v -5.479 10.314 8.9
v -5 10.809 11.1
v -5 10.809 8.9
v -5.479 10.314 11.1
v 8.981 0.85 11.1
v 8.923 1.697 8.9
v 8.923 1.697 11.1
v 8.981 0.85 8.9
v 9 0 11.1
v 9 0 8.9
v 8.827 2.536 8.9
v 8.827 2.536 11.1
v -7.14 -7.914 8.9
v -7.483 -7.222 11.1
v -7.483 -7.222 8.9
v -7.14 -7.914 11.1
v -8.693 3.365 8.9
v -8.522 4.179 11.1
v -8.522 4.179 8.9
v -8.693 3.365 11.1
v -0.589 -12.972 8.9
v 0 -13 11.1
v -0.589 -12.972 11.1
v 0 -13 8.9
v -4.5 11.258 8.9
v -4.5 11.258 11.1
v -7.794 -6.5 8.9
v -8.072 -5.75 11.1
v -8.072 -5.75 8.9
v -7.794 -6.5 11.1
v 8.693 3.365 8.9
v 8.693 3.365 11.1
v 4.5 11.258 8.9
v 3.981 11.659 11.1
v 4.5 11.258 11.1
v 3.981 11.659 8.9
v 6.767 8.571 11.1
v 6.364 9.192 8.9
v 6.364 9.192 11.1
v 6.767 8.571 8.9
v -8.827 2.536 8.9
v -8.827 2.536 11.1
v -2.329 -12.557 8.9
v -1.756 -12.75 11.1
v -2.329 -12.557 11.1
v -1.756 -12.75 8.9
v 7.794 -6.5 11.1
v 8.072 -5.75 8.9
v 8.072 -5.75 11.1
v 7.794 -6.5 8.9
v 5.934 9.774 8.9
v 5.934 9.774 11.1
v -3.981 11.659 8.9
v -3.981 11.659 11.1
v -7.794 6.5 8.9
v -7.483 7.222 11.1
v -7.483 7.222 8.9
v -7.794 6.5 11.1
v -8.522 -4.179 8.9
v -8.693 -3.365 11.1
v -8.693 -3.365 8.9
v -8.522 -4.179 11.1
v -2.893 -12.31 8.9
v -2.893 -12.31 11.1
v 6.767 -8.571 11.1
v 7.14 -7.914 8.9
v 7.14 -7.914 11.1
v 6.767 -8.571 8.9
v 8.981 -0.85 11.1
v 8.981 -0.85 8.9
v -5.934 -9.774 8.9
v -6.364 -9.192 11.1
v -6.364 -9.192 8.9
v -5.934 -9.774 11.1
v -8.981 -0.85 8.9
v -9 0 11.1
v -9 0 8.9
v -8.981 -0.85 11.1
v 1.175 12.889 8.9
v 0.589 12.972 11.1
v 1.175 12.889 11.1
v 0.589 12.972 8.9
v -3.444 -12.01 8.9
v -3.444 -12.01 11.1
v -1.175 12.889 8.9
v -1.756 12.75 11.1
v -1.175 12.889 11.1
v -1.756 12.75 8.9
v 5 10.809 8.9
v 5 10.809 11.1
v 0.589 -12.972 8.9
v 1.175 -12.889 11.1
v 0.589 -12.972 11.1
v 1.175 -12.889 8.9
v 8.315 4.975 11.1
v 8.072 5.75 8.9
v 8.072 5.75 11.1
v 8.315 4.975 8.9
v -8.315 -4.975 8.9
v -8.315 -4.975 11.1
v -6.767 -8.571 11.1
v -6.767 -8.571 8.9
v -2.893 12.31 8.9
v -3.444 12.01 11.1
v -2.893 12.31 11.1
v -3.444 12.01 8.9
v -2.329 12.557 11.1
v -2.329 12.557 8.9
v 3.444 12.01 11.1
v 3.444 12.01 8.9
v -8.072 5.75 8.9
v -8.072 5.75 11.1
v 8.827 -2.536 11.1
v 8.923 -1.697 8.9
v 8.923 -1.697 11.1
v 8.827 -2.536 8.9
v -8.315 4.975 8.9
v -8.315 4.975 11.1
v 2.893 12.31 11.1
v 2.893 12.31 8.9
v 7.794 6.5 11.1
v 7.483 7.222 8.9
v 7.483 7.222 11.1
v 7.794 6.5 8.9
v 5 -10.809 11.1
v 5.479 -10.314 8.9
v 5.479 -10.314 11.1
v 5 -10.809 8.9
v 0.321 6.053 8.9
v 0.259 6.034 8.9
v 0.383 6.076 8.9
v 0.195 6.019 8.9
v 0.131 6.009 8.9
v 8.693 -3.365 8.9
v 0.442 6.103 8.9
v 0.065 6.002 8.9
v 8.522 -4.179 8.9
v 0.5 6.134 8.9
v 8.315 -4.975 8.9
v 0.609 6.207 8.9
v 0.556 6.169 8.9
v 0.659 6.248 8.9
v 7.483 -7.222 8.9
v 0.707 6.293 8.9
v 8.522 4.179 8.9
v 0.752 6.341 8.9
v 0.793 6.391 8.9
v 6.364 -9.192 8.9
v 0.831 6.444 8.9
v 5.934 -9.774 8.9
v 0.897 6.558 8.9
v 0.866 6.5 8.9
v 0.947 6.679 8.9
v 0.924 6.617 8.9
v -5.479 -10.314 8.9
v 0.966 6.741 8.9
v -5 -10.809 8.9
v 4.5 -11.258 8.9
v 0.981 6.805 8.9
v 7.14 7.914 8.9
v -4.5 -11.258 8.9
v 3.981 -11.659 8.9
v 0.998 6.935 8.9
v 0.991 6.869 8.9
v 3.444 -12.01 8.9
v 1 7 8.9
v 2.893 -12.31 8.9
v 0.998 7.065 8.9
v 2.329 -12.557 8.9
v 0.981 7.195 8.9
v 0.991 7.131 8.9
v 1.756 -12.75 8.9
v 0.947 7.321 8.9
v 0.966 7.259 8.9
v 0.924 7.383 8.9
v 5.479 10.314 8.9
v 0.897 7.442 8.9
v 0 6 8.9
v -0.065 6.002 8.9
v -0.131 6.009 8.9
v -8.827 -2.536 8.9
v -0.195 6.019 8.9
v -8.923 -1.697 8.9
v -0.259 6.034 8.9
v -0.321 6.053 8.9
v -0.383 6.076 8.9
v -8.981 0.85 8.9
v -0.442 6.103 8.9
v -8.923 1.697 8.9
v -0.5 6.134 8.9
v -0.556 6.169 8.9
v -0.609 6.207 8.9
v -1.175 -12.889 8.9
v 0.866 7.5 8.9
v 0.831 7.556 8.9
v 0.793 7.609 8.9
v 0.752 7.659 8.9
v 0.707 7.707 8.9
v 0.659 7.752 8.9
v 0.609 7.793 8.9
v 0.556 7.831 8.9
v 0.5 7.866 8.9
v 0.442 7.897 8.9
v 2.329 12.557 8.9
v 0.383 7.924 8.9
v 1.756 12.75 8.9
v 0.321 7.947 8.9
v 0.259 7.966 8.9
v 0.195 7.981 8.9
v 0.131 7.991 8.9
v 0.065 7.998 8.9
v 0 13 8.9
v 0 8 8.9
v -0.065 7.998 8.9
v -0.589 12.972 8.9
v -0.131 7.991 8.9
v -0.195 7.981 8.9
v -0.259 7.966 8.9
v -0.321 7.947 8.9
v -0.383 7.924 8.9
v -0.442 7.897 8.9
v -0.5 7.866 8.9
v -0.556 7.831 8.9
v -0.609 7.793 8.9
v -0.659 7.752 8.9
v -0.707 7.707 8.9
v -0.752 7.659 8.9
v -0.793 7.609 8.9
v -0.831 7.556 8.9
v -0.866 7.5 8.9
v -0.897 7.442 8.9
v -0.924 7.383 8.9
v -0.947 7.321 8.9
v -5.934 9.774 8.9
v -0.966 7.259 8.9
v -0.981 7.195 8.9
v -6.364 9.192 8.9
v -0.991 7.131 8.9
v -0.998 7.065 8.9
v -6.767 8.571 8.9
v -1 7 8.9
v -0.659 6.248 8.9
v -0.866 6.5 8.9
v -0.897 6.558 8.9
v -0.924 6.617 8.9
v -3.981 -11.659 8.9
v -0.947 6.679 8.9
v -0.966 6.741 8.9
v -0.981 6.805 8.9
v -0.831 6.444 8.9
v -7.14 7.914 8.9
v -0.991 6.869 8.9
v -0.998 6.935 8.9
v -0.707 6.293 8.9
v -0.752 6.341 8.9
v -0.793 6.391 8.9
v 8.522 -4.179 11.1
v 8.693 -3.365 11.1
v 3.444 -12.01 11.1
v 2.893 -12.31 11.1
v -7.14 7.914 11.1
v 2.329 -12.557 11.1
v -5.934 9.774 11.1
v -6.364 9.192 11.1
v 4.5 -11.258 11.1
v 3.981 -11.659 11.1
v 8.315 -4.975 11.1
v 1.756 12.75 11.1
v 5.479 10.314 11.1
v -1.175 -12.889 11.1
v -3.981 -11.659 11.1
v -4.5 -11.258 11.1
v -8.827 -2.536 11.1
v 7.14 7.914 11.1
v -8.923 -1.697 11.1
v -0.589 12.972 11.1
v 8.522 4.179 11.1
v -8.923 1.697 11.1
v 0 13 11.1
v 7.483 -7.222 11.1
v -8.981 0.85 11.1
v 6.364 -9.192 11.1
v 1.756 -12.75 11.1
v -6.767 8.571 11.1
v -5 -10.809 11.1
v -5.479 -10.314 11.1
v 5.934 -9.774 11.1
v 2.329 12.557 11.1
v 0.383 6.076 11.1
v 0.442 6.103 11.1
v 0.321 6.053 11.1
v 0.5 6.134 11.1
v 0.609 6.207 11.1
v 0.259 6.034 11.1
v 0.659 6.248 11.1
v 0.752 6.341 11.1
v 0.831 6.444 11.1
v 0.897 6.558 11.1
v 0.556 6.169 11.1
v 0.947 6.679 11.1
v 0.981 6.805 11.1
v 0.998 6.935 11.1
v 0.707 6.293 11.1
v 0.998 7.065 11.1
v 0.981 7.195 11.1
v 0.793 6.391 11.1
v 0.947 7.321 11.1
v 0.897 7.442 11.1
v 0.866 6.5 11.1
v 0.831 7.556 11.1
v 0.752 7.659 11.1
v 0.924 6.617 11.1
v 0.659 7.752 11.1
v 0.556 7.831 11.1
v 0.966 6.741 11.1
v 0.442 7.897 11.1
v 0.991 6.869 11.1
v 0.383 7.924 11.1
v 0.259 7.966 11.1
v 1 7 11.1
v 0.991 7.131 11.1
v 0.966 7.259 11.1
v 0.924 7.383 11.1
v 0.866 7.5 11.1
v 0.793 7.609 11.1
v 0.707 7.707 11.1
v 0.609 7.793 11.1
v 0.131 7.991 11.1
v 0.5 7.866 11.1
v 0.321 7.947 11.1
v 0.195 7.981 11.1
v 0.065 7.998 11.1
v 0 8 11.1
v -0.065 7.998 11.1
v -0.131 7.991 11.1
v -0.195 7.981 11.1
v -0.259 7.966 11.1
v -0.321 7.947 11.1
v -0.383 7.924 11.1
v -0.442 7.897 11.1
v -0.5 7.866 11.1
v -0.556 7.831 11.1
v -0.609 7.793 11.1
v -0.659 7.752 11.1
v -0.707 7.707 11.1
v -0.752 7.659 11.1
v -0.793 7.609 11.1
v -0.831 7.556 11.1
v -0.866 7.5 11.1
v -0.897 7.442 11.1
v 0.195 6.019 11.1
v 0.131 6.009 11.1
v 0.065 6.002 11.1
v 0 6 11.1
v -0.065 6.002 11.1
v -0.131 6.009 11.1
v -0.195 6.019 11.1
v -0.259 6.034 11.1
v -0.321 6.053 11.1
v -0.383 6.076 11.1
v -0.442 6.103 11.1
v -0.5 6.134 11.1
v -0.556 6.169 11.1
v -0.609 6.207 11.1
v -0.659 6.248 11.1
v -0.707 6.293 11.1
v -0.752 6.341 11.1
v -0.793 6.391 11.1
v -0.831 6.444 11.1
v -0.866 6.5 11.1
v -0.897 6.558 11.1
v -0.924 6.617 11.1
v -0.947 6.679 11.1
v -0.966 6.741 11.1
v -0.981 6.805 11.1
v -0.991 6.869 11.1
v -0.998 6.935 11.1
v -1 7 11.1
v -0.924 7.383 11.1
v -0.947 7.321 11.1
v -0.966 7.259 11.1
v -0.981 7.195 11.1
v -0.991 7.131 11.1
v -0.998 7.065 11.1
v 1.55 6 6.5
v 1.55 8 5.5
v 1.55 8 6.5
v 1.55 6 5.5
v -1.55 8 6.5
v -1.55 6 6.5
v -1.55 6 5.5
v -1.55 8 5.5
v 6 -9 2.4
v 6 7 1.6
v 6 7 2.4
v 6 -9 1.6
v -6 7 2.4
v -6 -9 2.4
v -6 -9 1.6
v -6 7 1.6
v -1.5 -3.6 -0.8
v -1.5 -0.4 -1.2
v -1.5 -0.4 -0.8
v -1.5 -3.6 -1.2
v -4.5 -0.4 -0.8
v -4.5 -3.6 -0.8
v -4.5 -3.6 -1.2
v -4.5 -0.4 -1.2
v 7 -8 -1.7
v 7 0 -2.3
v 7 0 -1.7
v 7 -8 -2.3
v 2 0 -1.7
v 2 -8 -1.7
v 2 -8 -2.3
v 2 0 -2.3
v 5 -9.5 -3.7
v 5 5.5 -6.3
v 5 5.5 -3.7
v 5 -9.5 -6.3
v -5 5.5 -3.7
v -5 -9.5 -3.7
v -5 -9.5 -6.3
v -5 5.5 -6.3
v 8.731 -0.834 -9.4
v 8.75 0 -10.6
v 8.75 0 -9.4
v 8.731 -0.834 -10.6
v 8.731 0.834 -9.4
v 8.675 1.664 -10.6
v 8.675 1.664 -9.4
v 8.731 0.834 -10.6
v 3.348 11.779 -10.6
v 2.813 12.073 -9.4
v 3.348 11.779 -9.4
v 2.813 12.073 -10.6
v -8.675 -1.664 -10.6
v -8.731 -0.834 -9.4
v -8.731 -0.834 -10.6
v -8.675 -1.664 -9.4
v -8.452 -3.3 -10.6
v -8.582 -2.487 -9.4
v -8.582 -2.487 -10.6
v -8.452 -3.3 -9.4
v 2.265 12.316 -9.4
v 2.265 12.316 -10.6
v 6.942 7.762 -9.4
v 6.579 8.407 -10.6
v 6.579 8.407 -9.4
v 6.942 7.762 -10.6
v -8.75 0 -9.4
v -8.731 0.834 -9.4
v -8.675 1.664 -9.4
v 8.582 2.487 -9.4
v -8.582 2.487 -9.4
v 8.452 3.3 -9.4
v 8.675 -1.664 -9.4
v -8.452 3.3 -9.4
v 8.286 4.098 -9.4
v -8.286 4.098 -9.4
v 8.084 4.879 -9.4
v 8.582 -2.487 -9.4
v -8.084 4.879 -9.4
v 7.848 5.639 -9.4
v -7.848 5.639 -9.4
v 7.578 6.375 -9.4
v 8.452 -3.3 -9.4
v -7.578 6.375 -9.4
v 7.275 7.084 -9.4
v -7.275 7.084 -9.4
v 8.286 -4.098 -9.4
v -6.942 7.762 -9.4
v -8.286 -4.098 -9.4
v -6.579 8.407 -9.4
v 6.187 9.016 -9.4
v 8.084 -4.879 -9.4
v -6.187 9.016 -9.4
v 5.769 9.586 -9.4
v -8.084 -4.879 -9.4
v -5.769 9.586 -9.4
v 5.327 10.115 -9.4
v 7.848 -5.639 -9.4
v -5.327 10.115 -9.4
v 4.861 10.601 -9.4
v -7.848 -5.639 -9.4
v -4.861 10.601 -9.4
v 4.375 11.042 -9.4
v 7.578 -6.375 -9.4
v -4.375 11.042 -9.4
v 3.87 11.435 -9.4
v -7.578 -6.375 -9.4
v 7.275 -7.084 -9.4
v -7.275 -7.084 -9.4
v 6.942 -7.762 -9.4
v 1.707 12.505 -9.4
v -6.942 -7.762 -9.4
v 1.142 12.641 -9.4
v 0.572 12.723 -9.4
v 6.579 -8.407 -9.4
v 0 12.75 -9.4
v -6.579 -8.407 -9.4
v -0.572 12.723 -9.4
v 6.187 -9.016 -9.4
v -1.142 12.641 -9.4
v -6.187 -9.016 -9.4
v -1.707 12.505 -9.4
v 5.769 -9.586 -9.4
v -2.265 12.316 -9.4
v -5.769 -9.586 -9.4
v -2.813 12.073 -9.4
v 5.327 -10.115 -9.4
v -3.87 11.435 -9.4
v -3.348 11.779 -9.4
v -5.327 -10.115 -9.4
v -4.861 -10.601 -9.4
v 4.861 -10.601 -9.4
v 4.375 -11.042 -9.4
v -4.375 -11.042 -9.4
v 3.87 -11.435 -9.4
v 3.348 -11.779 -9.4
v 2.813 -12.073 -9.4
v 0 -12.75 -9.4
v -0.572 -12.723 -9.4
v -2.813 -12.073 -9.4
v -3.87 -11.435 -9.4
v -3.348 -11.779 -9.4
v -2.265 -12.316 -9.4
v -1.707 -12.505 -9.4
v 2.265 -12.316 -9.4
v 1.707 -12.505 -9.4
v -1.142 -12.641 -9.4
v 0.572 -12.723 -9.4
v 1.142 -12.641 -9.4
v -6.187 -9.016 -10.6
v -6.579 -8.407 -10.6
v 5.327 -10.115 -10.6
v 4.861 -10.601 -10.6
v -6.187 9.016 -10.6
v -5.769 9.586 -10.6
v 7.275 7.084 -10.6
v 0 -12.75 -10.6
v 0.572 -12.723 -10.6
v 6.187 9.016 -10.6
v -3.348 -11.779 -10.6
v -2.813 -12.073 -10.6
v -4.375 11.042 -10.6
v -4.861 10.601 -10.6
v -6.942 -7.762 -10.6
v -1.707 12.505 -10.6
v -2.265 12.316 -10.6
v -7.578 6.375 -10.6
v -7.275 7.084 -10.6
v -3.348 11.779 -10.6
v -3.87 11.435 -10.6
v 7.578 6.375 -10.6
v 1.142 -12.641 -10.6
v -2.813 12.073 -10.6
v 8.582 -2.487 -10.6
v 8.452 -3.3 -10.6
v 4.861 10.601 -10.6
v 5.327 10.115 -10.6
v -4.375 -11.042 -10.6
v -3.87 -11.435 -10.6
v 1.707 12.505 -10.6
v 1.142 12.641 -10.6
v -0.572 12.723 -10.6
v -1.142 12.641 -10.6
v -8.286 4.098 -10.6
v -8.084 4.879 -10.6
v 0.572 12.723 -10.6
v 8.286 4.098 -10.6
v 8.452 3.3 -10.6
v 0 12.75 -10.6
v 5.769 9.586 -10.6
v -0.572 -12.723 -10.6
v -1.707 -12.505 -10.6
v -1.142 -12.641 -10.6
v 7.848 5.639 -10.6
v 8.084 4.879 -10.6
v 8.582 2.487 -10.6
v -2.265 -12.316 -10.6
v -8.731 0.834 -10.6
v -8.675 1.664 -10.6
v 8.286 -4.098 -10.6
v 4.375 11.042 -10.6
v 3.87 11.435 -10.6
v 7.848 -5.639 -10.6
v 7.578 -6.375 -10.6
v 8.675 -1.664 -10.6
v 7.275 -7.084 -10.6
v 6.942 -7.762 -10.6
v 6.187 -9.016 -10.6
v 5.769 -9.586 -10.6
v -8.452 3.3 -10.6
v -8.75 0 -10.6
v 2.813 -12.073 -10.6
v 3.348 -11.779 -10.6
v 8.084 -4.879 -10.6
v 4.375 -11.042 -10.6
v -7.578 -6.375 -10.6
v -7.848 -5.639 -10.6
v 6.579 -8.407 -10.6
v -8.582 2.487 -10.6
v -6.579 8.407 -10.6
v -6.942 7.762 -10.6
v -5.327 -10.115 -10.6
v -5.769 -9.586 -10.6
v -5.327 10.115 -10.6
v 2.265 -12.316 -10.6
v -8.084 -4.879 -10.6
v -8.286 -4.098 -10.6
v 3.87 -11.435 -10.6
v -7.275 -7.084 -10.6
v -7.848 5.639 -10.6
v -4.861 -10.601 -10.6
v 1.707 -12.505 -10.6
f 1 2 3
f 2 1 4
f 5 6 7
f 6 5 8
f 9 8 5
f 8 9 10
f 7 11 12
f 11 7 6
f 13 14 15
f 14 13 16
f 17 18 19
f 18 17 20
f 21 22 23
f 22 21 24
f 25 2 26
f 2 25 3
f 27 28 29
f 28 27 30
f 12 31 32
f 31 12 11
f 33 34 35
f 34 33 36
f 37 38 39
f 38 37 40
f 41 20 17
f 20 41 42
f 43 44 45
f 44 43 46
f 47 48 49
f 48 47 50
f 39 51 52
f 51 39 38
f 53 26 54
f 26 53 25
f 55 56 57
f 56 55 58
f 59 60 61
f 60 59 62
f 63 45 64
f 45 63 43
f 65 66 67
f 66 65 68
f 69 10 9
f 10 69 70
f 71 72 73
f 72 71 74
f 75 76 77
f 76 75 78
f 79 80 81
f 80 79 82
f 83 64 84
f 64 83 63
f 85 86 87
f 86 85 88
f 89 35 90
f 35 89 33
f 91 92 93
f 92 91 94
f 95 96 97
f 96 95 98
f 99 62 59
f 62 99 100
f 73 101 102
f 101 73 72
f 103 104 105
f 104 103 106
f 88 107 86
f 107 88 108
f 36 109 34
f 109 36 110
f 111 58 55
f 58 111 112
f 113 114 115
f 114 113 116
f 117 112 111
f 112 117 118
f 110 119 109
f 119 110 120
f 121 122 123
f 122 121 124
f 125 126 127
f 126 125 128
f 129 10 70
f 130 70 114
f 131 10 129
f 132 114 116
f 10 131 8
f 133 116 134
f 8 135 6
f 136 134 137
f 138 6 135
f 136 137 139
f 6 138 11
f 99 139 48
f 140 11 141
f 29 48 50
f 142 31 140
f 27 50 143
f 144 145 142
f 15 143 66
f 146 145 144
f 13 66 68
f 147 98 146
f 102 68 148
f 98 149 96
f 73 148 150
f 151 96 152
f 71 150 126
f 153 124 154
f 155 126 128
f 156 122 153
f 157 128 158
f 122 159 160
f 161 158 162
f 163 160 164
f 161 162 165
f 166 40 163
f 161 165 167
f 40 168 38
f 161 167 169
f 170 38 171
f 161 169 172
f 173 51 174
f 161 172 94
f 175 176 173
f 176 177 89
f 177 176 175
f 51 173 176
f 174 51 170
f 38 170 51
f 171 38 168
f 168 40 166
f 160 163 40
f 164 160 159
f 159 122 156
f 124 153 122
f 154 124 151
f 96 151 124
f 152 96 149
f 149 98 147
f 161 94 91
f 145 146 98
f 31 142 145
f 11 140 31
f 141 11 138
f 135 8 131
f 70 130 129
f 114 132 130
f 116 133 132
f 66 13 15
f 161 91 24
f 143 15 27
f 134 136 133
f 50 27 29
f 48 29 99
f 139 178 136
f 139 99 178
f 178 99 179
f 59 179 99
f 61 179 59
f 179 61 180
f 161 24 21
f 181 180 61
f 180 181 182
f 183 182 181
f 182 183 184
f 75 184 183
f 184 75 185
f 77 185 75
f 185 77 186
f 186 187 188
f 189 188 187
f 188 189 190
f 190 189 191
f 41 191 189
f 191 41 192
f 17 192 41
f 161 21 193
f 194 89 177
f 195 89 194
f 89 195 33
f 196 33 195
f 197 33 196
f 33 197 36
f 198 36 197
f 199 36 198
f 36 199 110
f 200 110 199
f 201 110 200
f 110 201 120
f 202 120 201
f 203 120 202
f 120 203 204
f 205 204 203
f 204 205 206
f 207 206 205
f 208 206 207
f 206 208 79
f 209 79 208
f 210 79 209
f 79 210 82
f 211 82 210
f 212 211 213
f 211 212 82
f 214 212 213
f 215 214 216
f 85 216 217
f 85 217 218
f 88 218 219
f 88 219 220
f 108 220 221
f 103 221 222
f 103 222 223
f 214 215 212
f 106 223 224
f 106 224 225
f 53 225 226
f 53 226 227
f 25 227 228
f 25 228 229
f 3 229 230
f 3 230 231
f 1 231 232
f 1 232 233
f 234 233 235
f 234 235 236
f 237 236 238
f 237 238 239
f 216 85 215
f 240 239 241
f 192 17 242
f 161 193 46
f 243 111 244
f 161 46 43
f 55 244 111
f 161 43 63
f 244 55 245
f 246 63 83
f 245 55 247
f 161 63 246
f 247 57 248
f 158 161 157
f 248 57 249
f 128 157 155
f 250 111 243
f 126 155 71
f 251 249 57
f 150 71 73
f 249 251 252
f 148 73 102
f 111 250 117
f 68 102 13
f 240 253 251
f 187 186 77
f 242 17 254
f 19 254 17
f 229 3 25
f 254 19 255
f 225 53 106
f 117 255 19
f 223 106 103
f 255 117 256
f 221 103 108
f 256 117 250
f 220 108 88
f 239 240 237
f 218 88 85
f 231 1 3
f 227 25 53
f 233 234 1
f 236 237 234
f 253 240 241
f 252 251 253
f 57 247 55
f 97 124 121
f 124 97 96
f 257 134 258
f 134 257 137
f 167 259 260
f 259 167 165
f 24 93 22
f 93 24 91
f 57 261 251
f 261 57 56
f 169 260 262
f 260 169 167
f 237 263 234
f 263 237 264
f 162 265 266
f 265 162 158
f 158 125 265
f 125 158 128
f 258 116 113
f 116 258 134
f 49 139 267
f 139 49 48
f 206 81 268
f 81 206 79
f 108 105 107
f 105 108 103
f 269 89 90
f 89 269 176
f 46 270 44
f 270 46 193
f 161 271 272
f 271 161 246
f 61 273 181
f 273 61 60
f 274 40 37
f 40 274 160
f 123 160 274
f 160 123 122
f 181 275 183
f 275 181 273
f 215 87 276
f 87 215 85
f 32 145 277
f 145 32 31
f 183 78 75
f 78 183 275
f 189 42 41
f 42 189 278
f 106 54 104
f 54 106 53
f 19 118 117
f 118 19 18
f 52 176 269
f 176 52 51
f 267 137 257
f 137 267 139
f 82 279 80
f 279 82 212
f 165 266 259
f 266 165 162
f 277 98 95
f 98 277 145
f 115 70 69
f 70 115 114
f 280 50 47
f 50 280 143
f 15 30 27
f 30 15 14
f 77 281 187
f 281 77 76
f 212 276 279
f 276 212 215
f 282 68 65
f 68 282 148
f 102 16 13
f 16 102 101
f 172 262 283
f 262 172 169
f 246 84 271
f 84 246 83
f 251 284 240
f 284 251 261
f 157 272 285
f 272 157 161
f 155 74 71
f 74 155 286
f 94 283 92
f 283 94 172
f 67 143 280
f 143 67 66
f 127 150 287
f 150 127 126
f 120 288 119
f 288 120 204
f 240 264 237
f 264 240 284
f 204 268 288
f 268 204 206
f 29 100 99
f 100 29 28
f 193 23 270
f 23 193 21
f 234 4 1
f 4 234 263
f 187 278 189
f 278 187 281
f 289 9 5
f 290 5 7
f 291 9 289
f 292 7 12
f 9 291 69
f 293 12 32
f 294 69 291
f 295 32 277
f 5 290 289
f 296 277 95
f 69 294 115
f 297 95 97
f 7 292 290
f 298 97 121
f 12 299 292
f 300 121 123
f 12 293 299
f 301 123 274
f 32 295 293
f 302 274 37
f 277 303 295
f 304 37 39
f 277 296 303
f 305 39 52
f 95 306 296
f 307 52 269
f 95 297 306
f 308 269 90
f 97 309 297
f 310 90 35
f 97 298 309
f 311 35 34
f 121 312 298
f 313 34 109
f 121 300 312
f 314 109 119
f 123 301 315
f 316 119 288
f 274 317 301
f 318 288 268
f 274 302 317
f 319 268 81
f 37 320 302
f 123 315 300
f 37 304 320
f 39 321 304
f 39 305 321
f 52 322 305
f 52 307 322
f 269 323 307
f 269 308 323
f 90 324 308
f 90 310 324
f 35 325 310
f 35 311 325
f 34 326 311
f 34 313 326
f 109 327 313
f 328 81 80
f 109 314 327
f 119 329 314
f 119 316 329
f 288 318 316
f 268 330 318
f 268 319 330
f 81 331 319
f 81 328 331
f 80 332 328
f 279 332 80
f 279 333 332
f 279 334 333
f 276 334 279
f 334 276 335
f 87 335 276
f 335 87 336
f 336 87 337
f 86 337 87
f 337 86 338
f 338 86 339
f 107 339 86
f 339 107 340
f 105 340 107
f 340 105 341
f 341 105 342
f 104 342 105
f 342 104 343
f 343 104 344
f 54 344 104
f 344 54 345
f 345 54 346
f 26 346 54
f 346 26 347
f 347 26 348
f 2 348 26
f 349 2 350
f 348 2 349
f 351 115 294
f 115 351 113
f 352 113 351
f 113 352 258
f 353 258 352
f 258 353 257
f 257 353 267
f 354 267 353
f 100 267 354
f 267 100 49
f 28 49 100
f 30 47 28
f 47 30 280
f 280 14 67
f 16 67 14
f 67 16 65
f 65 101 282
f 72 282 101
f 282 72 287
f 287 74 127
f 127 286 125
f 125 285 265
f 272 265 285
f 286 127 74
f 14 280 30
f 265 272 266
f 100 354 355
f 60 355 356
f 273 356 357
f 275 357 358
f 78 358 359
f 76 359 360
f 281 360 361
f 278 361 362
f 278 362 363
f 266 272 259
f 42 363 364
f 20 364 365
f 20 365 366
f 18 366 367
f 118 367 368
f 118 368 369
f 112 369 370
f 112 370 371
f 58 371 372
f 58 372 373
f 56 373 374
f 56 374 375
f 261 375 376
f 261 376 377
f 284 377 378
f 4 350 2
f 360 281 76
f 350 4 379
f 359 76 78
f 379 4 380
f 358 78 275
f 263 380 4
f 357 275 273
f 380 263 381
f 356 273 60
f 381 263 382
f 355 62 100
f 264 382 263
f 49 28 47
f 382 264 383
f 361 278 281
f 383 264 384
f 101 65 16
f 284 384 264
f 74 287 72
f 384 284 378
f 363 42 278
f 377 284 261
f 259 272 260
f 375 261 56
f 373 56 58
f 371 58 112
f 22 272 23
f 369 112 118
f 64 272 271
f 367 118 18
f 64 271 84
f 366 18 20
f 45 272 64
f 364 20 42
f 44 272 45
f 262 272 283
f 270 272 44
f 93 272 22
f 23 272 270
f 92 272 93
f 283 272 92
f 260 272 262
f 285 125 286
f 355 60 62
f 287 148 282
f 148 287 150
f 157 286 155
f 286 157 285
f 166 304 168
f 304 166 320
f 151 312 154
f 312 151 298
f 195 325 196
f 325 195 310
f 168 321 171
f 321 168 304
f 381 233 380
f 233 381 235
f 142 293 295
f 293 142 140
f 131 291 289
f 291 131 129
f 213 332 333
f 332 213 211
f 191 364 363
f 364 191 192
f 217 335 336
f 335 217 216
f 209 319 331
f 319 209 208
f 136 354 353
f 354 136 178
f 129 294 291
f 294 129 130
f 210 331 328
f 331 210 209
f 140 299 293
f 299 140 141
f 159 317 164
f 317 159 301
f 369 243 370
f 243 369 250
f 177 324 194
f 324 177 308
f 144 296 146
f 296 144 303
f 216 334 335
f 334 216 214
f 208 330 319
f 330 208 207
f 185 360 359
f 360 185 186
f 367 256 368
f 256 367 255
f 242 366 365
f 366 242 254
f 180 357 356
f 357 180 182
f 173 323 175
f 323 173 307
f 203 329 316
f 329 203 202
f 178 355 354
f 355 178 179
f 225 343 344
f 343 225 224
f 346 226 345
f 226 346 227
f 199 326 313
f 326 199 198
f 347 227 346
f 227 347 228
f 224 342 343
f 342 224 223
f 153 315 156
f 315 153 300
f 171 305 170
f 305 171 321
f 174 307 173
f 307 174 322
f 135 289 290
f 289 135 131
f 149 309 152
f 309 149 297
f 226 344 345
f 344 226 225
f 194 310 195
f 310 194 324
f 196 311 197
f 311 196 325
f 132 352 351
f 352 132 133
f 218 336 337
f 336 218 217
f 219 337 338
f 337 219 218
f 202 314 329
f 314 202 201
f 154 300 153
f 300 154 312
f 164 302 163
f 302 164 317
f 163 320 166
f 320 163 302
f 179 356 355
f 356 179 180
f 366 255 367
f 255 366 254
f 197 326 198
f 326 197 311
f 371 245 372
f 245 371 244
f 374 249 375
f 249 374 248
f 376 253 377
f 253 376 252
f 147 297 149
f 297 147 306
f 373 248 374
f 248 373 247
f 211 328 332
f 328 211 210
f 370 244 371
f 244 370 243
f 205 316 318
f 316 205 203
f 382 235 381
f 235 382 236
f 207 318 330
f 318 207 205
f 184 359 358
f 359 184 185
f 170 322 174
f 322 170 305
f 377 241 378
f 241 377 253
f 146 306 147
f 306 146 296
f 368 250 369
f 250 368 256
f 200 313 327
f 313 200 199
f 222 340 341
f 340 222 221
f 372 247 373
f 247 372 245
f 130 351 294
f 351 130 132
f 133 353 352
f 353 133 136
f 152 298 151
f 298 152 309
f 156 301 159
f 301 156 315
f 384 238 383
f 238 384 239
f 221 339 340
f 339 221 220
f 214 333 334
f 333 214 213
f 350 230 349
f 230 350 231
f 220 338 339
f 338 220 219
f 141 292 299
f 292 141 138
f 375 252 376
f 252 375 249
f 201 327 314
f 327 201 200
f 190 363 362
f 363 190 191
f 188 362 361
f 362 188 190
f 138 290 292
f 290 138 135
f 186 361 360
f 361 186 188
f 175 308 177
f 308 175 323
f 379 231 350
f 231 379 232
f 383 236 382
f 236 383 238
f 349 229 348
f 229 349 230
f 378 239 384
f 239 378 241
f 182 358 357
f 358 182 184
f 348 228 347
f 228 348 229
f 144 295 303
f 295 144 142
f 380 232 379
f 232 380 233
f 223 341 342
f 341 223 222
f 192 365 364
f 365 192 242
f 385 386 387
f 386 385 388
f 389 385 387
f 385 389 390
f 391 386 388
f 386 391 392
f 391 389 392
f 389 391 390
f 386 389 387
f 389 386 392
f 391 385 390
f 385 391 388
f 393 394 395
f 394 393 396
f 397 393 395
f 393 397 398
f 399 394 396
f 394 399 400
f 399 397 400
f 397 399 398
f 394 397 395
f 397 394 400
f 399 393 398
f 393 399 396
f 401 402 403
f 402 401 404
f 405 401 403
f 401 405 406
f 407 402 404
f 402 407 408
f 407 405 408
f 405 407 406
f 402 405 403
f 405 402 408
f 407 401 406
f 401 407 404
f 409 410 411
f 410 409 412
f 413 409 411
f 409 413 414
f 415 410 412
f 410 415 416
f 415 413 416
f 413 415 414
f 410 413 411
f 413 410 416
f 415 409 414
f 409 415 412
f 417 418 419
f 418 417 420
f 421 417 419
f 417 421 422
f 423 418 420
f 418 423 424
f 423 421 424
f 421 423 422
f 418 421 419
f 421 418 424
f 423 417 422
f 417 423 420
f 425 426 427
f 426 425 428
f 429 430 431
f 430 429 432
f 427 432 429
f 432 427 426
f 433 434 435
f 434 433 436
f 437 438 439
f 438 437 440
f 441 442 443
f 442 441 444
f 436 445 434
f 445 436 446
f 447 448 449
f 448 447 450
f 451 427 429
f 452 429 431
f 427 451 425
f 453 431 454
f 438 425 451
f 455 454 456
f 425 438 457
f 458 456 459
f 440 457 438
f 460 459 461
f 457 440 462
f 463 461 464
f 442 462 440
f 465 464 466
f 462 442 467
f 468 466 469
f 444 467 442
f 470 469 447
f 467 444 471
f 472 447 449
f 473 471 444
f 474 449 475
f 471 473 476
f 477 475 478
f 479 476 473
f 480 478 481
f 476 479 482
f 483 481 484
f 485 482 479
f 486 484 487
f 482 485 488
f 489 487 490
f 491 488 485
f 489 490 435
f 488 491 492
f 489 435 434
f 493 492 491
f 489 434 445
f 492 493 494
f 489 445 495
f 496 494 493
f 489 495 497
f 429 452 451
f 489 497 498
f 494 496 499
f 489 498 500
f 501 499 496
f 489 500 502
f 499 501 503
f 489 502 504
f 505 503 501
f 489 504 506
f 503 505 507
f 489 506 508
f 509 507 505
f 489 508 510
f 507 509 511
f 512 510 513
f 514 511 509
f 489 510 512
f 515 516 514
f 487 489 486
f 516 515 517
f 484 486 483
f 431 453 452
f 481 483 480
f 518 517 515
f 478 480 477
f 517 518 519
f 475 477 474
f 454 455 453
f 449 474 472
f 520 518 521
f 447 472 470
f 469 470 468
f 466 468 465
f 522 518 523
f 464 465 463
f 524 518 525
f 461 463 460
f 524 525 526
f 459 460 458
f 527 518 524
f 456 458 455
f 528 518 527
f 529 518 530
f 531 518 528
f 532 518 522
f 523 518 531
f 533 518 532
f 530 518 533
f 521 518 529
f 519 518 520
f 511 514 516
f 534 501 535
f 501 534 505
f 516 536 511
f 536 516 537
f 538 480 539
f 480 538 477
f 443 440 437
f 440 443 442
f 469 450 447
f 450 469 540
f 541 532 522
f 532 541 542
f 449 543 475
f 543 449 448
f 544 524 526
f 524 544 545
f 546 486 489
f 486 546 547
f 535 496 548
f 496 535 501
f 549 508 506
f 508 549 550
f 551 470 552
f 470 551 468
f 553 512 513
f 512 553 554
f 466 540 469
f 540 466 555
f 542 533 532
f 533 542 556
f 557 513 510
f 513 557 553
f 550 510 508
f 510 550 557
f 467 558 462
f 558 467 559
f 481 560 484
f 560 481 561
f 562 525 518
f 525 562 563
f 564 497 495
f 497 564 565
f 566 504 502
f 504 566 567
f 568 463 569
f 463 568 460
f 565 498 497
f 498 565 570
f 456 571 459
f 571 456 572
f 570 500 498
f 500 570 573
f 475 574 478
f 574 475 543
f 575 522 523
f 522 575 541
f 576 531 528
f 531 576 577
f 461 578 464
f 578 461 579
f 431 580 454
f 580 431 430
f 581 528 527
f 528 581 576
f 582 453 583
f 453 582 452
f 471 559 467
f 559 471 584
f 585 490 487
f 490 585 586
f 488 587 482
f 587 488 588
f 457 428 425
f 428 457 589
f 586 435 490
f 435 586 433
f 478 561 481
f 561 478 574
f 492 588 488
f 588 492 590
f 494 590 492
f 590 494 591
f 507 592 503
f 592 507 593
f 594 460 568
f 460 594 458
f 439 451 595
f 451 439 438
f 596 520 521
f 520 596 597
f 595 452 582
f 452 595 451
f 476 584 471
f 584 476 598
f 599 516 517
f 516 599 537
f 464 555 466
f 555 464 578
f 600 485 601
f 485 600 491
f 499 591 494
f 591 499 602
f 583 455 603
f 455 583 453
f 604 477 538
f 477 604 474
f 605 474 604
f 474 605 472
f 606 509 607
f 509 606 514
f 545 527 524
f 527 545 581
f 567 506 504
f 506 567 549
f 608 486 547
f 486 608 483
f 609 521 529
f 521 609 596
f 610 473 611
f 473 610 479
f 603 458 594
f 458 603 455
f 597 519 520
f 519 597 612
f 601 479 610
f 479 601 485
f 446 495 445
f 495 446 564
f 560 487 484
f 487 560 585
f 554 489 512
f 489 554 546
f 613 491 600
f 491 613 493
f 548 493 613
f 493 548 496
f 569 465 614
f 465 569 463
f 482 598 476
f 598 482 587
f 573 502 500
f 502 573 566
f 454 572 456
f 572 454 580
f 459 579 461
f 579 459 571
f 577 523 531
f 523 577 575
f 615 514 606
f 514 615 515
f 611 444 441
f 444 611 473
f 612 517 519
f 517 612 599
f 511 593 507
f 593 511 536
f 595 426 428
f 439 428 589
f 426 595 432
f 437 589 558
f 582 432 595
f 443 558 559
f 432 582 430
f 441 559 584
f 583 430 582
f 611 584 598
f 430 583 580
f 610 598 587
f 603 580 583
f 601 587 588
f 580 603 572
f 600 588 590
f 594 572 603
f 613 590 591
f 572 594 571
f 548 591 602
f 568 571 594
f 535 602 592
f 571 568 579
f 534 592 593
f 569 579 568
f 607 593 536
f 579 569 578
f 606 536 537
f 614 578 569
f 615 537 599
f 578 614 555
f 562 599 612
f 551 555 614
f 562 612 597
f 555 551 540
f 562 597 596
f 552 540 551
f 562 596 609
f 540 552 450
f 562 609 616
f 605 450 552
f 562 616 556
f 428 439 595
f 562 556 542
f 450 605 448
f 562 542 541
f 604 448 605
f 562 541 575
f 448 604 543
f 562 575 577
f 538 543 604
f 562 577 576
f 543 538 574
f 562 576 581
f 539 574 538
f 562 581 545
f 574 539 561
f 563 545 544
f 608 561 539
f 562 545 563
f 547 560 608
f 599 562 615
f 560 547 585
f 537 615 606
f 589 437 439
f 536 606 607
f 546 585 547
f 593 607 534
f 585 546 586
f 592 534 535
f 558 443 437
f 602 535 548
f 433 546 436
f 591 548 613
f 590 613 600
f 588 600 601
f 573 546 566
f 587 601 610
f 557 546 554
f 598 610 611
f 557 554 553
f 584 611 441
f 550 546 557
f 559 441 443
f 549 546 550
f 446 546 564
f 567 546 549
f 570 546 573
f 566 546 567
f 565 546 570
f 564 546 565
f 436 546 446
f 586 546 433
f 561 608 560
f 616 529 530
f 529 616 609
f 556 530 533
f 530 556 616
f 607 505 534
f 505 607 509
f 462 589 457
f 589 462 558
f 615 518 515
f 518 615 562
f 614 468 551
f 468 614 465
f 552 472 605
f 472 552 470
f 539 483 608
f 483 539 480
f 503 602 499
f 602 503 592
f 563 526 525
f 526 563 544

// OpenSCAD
// DAO engineering layout preview — not final industrial design
$fn=96;
module ellipse3d(w,h,t){scale([w/2,h/2,1]) cylinder(h=t,r=1,center=true);}
module part(z,labeltxt){translate([0,0,z]) children();}
color([0.8,0.76,0.68]) part(10) difference(){ellipse3d(18,26,2.2);translate([0,7,0])cylinder(h=4,r=1,center=true);}
color([0.85,0.92,0.95]) part(6) translate([0,7,0]) cube([3.1,2,1],center=true);
color([0.3,0.45,0.35]) part(2) translate([0,-1,0]) cube([12,16,.8],center=true);
color([0.25,0.3,0.28]) part(-1) translate([-3,-2,0]) cube([3,3.2,.4],center=true);
color([0.9,0.7,0.45,0.35]) part(-2) translate([4.5,-4,0]) cube([5,8,.6],center=true);
color([0.65,0.7,0.75]) part(-5) translate([0,-2,0]) cube([10,15,2.6],center=true);
color([0.72,0.7,0.65]) part(-10) ellipse3d(17.5,25.5,1.2);
